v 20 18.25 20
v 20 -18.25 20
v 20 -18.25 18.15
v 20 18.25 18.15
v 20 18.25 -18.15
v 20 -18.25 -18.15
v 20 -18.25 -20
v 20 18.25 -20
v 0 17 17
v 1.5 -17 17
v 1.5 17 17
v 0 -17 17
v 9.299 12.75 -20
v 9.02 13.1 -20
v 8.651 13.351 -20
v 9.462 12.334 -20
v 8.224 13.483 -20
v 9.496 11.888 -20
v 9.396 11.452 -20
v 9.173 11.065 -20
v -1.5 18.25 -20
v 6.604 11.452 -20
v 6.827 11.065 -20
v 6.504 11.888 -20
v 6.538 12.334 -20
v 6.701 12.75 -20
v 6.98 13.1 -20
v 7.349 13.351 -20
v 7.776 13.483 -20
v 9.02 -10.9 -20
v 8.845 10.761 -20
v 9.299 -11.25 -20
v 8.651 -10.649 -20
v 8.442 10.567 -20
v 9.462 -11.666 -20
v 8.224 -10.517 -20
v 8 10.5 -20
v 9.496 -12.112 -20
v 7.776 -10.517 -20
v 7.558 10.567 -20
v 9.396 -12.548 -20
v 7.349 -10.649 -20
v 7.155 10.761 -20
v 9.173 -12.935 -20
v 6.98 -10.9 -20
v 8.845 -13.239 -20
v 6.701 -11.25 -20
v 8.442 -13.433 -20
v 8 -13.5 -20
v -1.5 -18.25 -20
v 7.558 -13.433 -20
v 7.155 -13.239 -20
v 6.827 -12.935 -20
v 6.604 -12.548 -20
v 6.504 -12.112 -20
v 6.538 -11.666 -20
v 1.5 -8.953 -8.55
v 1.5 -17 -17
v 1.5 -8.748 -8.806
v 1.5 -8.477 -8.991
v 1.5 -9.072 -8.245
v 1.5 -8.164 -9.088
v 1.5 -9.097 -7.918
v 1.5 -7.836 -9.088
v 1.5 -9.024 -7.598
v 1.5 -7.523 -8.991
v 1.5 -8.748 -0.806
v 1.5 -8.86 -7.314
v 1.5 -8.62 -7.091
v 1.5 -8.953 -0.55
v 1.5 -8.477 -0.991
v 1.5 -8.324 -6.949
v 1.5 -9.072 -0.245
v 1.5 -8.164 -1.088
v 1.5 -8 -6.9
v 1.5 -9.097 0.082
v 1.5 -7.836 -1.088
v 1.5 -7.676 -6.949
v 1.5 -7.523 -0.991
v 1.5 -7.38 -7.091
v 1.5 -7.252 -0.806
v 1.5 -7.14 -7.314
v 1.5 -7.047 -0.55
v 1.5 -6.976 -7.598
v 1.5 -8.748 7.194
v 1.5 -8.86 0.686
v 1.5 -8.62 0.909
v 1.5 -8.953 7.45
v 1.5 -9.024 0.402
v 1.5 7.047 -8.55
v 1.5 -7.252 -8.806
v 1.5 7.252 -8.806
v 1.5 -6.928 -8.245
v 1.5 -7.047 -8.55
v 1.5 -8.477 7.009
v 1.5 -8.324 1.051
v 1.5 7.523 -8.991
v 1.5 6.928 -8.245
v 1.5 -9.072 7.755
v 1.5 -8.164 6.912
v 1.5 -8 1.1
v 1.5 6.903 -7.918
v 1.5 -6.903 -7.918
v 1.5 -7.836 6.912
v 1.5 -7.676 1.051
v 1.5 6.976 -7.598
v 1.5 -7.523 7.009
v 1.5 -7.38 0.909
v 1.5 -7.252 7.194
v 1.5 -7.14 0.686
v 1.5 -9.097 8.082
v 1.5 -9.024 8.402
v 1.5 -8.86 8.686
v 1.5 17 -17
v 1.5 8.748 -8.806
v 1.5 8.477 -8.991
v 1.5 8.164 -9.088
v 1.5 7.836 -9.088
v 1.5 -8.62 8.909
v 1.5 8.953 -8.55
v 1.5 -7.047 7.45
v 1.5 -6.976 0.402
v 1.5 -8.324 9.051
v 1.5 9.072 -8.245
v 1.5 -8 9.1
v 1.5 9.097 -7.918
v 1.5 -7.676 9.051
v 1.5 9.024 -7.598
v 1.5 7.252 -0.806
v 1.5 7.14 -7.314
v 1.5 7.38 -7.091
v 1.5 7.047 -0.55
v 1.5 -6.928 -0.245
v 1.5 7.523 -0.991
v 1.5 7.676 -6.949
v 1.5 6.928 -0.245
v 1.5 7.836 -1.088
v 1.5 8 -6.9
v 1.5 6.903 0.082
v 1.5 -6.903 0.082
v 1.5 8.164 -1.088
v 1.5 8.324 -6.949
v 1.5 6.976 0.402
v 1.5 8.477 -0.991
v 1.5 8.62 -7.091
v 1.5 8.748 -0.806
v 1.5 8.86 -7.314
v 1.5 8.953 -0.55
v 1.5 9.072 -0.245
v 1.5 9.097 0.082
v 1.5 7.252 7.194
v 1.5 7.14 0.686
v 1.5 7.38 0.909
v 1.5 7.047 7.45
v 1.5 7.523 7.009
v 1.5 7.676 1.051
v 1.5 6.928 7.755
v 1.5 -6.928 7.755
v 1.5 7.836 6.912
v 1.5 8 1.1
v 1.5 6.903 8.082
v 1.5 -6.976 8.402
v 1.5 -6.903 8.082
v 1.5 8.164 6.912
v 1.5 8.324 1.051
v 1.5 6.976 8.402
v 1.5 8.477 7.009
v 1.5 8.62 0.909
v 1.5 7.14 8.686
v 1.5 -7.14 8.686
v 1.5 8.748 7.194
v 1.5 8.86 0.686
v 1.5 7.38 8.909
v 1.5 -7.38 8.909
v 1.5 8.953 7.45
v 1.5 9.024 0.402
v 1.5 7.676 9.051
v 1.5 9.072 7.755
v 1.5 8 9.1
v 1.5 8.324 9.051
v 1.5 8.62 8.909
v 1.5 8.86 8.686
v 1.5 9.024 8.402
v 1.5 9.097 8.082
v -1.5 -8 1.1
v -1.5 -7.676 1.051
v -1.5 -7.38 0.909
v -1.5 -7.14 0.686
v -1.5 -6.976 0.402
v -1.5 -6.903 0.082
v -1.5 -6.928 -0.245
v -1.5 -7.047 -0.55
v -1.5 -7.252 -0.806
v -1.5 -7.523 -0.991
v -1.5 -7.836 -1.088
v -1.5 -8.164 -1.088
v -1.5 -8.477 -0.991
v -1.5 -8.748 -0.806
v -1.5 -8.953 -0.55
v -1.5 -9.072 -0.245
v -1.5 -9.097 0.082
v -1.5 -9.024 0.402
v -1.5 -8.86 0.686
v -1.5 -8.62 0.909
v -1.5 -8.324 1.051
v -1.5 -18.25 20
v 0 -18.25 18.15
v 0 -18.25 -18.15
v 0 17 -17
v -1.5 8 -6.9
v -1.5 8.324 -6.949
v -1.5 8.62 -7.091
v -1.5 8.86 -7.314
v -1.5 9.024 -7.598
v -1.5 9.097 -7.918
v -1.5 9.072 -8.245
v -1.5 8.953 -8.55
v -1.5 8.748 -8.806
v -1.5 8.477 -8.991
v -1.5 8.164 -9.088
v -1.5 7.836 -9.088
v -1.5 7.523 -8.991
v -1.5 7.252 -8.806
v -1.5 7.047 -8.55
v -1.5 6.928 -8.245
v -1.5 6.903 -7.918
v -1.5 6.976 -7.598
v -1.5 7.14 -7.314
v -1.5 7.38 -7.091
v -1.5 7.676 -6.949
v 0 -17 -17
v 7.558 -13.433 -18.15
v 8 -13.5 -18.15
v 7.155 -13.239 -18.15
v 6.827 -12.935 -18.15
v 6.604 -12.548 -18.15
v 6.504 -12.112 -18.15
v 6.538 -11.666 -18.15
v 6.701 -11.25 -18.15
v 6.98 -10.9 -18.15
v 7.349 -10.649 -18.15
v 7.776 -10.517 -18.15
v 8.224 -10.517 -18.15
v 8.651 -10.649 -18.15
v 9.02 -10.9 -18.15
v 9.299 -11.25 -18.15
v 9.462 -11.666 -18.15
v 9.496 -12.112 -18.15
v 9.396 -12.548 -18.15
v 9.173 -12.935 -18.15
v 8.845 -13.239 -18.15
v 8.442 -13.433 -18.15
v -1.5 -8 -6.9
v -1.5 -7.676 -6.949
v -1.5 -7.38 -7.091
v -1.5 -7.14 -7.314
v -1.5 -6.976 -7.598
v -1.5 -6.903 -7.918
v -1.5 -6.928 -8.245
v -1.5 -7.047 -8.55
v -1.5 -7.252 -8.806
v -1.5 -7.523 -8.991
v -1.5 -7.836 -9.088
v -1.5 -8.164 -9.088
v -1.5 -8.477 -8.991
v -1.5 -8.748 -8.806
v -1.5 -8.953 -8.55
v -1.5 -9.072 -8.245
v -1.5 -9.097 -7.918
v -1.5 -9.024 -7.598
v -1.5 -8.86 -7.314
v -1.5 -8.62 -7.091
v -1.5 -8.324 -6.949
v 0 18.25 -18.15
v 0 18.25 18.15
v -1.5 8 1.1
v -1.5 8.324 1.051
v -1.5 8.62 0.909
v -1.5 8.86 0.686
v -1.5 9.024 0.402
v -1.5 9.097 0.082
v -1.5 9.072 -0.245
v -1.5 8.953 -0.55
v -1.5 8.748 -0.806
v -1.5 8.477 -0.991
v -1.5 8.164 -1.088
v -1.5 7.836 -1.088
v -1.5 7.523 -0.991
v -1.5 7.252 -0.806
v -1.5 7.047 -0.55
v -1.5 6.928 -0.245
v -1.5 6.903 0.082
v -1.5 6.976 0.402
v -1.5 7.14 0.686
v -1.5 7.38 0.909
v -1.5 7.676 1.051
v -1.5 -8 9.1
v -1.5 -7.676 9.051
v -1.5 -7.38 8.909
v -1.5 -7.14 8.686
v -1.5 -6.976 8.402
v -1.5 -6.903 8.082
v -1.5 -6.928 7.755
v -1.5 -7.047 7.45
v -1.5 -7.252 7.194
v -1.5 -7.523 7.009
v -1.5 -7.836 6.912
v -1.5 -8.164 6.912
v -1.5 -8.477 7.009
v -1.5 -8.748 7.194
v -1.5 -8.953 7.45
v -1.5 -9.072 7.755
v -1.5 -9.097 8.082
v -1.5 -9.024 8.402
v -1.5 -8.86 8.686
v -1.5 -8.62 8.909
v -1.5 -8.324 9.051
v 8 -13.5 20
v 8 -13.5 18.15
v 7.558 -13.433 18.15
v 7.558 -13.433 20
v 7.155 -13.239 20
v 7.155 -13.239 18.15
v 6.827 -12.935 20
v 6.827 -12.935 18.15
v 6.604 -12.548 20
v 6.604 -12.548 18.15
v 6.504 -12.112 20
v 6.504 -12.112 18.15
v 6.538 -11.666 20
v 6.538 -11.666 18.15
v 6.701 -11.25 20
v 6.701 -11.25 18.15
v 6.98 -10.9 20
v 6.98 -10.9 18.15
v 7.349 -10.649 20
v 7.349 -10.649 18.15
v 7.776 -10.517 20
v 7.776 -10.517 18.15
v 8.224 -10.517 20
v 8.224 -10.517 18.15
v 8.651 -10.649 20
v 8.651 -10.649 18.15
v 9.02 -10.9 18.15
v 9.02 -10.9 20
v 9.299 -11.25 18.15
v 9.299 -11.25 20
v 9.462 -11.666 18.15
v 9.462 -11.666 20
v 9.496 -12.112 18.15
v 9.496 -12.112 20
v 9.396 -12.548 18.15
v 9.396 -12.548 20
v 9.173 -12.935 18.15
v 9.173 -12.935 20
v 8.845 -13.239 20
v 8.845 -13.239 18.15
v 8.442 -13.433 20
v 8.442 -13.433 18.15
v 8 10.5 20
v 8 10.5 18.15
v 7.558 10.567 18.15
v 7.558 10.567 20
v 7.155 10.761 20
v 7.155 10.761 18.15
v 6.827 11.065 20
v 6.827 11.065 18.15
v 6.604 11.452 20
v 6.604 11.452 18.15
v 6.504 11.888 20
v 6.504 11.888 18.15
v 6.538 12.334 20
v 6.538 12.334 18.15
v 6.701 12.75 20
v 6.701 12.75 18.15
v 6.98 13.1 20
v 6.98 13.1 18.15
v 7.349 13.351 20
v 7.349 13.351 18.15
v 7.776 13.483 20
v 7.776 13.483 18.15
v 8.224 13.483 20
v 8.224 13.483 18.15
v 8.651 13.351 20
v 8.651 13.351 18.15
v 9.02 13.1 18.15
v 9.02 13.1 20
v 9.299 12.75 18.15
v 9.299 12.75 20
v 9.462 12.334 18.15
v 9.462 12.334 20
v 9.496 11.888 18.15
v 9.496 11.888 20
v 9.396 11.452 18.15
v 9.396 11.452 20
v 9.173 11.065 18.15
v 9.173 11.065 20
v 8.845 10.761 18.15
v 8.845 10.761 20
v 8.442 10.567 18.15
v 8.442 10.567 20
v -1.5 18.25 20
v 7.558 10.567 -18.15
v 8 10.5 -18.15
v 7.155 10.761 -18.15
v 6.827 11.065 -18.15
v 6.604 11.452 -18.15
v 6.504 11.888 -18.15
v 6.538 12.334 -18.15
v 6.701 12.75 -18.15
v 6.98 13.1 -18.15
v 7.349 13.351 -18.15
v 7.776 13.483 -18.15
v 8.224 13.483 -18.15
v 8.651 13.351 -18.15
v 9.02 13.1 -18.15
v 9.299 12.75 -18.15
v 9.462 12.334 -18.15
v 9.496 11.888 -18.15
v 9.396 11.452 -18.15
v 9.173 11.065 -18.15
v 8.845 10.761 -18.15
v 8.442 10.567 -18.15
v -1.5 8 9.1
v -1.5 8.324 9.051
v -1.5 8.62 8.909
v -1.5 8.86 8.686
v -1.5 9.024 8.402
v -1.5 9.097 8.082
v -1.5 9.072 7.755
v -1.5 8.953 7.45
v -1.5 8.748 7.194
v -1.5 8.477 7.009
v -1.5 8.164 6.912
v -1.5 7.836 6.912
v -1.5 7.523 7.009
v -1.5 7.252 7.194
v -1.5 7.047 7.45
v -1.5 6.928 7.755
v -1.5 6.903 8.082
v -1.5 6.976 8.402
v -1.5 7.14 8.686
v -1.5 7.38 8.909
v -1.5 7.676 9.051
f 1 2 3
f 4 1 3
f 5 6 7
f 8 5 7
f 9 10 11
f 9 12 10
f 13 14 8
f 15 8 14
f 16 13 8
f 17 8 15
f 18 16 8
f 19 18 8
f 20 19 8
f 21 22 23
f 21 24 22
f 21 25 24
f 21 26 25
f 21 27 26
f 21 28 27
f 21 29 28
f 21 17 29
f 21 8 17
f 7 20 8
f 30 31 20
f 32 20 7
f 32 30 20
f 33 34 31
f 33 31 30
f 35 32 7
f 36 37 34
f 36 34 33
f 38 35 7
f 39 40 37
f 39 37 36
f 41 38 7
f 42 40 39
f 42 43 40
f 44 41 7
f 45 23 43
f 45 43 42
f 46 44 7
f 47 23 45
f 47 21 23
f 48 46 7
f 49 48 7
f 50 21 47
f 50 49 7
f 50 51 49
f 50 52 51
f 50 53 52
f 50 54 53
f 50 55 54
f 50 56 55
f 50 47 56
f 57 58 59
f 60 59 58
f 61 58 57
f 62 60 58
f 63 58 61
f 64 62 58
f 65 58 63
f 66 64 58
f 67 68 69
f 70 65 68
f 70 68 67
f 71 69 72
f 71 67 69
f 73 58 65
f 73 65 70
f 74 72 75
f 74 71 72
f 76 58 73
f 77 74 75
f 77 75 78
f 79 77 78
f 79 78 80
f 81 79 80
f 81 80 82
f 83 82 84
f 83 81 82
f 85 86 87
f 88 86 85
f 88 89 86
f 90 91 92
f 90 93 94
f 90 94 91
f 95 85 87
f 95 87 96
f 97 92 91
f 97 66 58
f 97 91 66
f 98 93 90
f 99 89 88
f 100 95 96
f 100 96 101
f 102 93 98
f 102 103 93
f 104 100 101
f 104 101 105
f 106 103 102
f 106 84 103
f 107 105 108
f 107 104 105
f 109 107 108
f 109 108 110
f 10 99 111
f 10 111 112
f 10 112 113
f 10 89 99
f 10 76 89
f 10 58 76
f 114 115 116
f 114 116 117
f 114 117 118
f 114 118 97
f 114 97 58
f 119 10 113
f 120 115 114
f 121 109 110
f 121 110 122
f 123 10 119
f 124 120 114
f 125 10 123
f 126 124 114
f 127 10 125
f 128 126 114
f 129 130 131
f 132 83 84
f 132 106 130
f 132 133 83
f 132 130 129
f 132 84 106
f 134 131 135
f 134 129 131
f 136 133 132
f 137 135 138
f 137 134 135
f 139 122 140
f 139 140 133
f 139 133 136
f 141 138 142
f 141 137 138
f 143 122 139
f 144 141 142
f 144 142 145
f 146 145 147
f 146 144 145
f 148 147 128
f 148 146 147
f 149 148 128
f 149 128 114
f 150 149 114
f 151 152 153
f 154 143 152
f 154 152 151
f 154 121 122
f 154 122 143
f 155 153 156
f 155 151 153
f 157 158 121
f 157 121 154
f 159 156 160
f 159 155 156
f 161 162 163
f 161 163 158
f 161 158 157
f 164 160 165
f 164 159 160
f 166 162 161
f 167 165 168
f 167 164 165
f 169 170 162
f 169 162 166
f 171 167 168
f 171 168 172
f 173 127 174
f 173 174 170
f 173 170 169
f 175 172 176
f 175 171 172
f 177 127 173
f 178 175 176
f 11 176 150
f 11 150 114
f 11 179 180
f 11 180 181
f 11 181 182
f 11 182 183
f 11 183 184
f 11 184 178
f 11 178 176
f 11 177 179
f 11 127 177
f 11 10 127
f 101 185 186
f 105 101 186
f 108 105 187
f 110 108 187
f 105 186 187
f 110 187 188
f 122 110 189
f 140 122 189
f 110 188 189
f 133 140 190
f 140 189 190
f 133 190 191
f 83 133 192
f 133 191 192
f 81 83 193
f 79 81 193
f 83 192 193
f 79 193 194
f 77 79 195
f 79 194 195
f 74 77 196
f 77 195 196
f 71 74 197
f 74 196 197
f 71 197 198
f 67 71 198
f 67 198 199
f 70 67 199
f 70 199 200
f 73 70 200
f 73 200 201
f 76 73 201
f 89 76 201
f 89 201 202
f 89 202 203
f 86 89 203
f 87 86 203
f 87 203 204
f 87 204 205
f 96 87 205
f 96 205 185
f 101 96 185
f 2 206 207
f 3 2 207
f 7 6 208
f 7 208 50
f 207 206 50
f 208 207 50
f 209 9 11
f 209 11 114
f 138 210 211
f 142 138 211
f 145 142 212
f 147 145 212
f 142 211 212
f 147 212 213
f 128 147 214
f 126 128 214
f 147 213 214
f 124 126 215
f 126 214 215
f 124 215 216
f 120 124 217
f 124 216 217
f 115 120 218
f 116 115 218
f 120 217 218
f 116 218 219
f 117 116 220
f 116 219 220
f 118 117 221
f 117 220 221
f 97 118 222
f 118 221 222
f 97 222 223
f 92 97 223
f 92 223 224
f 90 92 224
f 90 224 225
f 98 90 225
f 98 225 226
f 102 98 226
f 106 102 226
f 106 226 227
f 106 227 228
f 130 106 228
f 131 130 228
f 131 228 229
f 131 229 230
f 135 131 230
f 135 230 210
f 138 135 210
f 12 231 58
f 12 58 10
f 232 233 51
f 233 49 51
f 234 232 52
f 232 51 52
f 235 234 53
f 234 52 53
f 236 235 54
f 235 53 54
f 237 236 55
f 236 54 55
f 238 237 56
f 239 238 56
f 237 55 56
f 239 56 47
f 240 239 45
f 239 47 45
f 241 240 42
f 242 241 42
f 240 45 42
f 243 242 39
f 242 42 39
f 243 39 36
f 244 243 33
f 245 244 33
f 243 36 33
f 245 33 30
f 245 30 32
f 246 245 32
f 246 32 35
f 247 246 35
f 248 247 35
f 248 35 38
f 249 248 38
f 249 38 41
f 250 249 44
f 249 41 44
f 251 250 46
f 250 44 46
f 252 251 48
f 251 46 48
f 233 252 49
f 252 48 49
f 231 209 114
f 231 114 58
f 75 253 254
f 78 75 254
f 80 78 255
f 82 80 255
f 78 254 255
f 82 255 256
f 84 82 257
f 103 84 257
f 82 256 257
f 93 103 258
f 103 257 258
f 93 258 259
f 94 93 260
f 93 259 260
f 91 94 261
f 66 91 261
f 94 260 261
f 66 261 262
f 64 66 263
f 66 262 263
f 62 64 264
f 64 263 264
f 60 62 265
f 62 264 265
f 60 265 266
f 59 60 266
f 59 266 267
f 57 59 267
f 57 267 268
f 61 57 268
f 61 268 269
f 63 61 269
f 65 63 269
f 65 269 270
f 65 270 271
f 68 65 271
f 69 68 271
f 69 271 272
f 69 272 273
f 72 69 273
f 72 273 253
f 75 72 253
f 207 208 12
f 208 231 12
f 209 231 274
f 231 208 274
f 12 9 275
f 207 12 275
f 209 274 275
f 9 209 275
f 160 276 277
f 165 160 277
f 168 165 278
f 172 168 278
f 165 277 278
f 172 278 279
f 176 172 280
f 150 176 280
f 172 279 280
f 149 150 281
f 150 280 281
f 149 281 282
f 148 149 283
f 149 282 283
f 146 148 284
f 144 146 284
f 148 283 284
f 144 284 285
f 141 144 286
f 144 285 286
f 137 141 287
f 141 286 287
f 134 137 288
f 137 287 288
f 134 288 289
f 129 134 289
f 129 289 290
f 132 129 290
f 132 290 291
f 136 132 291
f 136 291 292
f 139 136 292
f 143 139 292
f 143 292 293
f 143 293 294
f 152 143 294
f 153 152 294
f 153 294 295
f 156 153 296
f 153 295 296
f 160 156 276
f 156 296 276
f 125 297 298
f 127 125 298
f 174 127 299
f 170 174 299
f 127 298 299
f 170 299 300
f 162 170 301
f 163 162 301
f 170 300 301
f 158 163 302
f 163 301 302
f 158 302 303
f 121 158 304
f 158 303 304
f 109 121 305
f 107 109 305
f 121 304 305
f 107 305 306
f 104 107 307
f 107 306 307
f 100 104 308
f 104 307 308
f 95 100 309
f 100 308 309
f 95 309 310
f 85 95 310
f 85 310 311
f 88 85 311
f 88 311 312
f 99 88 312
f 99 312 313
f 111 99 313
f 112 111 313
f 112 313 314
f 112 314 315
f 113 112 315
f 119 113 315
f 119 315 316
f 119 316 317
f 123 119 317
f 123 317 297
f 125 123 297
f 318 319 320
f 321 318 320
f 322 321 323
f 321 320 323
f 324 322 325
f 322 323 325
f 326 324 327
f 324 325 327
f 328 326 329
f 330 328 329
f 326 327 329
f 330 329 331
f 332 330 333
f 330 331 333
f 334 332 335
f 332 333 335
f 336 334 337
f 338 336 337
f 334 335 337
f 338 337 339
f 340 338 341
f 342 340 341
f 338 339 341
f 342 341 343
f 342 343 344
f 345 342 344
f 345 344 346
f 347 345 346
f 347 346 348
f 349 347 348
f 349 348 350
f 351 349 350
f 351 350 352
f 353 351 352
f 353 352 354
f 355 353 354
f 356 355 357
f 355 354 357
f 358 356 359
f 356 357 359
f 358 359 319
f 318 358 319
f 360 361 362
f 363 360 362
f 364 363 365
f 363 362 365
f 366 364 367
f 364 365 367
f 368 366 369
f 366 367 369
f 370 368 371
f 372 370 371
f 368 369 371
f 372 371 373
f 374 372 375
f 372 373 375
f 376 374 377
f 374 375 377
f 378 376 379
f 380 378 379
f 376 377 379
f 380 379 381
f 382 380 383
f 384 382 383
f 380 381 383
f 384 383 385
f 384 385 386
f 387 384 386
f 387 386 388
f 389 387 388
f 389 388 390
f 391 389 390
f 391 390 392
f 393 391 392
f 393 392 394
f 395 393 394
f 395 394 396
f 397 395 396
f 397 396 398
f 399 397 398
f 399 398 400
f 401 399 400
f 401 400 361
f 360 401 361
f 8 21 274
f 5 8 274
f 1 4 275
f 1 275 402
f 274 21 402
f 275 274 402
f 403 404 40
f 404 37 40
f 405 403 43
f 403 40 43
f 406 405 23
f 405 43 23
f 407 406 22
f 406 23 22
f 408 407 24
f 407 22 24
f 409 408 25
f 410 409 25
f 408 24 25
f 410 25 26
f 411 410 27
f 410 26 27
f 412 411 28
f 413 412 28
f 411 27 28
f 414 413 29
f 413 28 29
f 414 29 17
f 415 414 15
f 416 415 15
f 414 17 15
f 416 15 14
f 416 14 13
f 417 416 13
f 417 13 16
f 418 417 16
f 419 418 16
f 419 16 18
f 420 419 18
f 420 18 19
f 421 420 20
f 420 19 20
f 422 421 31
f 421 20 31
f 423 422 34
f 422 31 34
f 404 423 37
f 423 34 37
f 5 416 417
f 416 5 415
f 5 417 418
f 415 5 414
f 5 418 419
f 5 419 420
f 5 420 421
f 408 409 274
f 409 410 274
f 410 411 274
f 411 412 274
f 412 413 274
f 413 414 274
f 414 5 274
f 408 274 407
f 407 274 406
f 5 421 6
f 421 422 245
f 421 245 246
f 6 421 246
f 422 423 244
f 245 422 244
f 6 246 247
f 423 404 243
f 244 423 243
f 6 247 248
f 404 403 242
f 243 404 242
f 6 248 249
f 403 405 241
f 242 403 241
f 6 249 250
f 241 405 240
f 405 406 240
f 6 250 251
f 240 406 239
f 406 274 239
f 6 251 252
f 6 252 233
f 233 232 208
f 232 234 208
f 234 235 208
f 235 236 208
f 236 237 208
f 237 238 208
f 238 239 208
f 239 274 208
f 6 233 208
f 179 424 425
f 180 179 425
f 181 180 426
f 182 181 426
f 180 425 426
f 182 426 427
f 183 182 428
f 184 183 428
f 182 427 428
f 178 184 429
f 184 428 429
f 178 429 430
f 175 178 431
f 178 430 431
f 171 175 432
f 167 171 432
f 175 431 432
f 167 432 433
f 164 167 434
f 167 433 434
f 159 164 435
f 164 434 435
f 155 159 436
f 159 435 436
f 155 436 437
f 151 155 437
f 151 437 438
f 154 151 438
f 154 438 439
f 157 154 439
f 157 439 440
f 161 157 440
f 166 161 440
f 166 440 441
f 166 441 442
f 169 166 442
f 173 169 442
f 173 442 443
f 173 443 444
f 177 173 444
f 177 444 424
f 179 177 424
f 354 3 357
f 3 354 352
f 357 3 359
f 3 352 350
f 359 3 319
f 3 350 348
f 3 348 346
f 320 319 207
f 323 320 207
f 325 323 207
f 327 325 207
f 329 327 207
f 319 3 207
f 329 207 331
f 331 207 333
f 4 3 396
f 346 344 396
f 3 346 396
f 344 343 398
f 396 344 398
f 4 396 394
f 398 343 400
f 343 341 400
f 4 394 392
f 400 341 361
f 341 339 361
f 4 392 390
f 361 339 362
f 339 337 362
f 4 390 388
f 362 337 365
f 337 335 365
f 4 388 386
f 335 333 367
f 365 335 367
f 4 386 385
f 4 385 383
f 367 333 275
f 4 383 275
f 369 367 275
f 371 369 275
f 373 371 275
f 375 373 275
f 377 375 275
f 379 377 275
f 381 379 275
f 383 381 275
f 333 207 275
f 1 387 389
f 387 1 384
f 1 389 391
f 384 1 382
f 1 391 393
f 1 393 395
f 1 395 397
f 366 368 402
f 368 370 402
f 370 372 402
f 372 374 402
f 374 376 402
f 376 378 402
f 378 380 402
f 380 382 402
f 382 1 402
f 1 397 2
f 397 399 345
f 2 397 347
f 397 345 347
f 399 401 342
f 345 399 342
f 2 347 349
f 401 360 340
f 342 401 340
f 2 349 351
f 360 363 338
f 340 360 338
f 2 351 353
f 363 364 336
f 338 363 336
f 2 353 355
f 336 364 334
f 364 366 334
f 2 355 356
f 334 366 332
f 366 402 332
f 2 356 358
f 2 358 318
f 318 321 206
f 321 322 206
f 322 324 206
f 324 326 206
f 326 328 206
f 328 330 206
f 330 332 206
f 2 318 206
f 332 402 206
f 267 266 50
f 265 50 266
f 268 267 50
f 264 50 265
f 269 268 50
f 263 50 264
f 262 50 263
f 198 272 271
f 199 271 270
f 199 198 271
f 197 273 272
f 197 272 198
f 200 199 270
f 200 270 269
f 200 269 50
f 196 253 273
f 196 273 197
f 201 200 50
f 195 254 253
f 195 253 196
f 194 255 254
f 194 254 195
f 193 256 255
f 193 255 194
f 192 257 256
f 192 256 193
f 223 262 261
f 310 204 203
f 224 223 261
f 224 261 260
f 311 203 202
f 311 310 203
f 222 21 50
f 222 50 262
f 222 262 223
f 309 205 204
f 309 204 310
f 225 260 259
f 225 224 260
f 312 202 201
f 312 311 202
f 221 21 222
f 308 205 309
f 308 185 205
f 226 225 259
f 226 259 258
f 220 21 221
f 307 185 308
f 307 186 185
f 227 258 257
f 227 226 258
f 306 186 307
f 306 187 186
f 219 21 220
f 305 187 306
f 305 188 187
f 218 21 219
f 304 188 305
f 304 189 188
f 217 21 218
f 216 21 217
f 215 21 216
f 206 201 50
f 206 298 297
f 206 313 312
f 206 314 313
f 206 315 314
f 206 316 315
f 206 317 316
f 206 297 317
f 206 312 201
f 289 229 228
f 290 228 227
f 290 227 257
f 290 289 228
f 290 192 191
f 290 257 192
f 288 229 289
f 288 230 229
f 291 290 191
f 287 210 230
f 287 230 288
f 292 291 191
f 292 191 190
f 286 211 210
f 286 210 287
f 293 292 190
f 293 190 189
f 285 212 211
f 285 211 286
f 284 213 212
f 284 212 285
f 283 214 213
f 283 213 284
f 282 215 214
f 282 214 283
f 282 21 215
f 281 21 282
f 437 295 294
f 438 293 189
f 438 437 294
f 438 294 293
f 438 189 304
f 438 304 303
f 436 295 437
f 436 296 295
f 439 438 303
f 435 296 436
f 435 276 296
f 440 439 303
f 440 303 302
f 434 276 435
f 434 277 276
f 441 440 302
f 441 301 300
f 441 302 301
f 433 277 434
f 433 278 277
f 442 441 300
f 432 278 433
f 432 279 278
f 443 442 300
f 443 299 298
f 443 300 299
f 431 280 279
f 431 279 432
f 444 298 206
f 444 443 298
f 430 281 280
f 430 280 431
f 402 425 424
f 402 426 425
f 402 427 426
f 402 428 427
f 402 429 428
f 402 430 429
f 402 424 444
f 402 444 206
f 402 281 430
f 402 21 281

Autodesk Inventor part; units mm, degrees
ref_plane "YZ Plane" through (0, 0, 0) normal (1, 0, 0) x (0, 1, 0)
ref_plane "XZ Plane" through (0, 0, 0) normal (0, 1, 0) x (-1, 0, 0)
ref_plane "XY Plane" through (0, 0, 0) normal (0, 0, 1) x (1, 0, 0)
sketch "Boceto1" plane through (0, 0, 0) normal (1, 0, 0) x (0, 1, 0)
  line L0 (-17, 17) -> (17, 17)
  line L1 (17, 17) -> (17, -17)
  line L2 (17, -17) -> (-17, -17)
  line L3 (-17, -17) -> (-17, 17)
  line L4 (-17, 17) -> (17, -17) construction
  line L5 (17, 17) -> (-17, -17) construction
  point P0 (0, 0)
  dimension "d0" = 34
  dimension "d1" = 34
extrude "Extrusión1" add sketch "Boceto1" along normal blind 1.5
sketch "Boceto2" plane through (0, 0, 0) normal (-1, 0, 0) x (0, 0, 1)
  line L0 (-20, -18.25) -> (20, -18.25)
  line L1 (20, -18.25) -> (20, 18.25)
  line L2 (20, 18.25) -> (-20, 18.25)
  line L3 (-20, 18.25) -> (-20, -18.25)
  line L4 (-20, -18.25) -> (20, 18.25) construction
  line L5 (20, -18.25) -> (-20, 18.25) construction
  point P0 (0, 0)
  dimension "d4" = 36.5
  dimension "d5" = 40
extrude "Extrusión2" add sketch "Boceto2" along normal blind 1.5
sketch "Boceto3" plane through (0, 0, 0) normal (1, 0, 0) x (0, 0, -1)
  line L0 (-20, 17.8927) -> (-20, -18.25)
  line L1 (-20, 18.25) -> (-20, -18.25)
  line L2 (20, -18.25) -> (-20, -18.25) projected
  line L3 (-18.15, -18.25) -> (-18.15, 18.25)
  line L4 (-18.15, 18.25) -> (-20, 18.25)
  line L5 (-20, -18.25) -> (-18.15, -18.25)
  line L6 (0, 18.25) -> (0, 10.0578) construction
  line L7 (20, 17.8927) -> (20, -18.25)
  line L8 (18.15, -18.25) -> (18.15, 18.25)
  line L9 (18.15, -18.25) -> (20, -18.25)
  point P0 (0, 0)
  dimension "d8" = 1.85
extrude "Extrusión3" add sketch "Boceto3" along normal blind 20
sketch "Boceto4" plane through (0, 0, 0) normal (1, 0, 0) x (0, 0, -1)
  line L0 (20, 18.25) -> (20, -18.25) projected
  line L1 (20, 18.25) -> (20, -18.25)
  line L2 (20, 18.25) -> (18.15, 18.25)
  line L3 (-18.15, 18.25) -> (20, 18.25) projected
  line L4 (18.15, 18.25) -> (18.15, -18.25)
  line L5 (18.15, -18.25) -> (20, -18.25)
  point P0 (0, 0)
  dimension "d11" = 1.85
extrude "Extrusión4" add sketch "Boceto4" along normal blind 20
sketch "Boceto5" plane through (-1.5, -18.25, 20) normal (0, 0, 1) x (1, 0, 0)
  line L0 (1.5, 18.25) -> (9.5, 18.25)
  line L1 (9.5, 18.25) -> (9.5, 30.25)
  line L2 (9.5, 18.25) -> (9.5, 6.25)
  dimension "d14" = 12
  dimension "d15" = 8
hole "Agujero1" at (8, 12, 20) at (8, -12, 20) direction (0, 0, -1) diameter 3 end through all
sketch "Boceto6" plane through (-1.5, 0, 0) normal (-1, 0, 0) x (0, 0, 1)
  line L0 (0, 0) -> (0, 8) construction
  circle A0 centre (0, 8) radius 1.1
  line L1 (0, 0) -> (7.3634, 0) construction
  circle A1 centre (0, -8) radius 1.1
  circle A2 centre (8, 8) radius 1.1
  circle A3 centre (8, -8) radius 1.1
  line L2 (0, 8) -> (-8, 8) construction
  circle A4 centre (-8, 8) radius 1.1
  circle A5 centre (-8, -8) radius 1.1
  line L3 (20, -18.25) -> (18.15, -18.25) projected
  line L4 (-20, 18.25) -> (-20, 9.1)
  dimension "d23" = 8
  dimension "d24" = 2.2
  dimension "d27" = 16
  dimension "d30" = 8
  dimension "d33" = 8
  dimension "d34" = 2.2
extrude "Extrusión5" cut sketch "Boceto6" against normal blind 10
properties part number "Tapa_R" material "Plástico ABS"
